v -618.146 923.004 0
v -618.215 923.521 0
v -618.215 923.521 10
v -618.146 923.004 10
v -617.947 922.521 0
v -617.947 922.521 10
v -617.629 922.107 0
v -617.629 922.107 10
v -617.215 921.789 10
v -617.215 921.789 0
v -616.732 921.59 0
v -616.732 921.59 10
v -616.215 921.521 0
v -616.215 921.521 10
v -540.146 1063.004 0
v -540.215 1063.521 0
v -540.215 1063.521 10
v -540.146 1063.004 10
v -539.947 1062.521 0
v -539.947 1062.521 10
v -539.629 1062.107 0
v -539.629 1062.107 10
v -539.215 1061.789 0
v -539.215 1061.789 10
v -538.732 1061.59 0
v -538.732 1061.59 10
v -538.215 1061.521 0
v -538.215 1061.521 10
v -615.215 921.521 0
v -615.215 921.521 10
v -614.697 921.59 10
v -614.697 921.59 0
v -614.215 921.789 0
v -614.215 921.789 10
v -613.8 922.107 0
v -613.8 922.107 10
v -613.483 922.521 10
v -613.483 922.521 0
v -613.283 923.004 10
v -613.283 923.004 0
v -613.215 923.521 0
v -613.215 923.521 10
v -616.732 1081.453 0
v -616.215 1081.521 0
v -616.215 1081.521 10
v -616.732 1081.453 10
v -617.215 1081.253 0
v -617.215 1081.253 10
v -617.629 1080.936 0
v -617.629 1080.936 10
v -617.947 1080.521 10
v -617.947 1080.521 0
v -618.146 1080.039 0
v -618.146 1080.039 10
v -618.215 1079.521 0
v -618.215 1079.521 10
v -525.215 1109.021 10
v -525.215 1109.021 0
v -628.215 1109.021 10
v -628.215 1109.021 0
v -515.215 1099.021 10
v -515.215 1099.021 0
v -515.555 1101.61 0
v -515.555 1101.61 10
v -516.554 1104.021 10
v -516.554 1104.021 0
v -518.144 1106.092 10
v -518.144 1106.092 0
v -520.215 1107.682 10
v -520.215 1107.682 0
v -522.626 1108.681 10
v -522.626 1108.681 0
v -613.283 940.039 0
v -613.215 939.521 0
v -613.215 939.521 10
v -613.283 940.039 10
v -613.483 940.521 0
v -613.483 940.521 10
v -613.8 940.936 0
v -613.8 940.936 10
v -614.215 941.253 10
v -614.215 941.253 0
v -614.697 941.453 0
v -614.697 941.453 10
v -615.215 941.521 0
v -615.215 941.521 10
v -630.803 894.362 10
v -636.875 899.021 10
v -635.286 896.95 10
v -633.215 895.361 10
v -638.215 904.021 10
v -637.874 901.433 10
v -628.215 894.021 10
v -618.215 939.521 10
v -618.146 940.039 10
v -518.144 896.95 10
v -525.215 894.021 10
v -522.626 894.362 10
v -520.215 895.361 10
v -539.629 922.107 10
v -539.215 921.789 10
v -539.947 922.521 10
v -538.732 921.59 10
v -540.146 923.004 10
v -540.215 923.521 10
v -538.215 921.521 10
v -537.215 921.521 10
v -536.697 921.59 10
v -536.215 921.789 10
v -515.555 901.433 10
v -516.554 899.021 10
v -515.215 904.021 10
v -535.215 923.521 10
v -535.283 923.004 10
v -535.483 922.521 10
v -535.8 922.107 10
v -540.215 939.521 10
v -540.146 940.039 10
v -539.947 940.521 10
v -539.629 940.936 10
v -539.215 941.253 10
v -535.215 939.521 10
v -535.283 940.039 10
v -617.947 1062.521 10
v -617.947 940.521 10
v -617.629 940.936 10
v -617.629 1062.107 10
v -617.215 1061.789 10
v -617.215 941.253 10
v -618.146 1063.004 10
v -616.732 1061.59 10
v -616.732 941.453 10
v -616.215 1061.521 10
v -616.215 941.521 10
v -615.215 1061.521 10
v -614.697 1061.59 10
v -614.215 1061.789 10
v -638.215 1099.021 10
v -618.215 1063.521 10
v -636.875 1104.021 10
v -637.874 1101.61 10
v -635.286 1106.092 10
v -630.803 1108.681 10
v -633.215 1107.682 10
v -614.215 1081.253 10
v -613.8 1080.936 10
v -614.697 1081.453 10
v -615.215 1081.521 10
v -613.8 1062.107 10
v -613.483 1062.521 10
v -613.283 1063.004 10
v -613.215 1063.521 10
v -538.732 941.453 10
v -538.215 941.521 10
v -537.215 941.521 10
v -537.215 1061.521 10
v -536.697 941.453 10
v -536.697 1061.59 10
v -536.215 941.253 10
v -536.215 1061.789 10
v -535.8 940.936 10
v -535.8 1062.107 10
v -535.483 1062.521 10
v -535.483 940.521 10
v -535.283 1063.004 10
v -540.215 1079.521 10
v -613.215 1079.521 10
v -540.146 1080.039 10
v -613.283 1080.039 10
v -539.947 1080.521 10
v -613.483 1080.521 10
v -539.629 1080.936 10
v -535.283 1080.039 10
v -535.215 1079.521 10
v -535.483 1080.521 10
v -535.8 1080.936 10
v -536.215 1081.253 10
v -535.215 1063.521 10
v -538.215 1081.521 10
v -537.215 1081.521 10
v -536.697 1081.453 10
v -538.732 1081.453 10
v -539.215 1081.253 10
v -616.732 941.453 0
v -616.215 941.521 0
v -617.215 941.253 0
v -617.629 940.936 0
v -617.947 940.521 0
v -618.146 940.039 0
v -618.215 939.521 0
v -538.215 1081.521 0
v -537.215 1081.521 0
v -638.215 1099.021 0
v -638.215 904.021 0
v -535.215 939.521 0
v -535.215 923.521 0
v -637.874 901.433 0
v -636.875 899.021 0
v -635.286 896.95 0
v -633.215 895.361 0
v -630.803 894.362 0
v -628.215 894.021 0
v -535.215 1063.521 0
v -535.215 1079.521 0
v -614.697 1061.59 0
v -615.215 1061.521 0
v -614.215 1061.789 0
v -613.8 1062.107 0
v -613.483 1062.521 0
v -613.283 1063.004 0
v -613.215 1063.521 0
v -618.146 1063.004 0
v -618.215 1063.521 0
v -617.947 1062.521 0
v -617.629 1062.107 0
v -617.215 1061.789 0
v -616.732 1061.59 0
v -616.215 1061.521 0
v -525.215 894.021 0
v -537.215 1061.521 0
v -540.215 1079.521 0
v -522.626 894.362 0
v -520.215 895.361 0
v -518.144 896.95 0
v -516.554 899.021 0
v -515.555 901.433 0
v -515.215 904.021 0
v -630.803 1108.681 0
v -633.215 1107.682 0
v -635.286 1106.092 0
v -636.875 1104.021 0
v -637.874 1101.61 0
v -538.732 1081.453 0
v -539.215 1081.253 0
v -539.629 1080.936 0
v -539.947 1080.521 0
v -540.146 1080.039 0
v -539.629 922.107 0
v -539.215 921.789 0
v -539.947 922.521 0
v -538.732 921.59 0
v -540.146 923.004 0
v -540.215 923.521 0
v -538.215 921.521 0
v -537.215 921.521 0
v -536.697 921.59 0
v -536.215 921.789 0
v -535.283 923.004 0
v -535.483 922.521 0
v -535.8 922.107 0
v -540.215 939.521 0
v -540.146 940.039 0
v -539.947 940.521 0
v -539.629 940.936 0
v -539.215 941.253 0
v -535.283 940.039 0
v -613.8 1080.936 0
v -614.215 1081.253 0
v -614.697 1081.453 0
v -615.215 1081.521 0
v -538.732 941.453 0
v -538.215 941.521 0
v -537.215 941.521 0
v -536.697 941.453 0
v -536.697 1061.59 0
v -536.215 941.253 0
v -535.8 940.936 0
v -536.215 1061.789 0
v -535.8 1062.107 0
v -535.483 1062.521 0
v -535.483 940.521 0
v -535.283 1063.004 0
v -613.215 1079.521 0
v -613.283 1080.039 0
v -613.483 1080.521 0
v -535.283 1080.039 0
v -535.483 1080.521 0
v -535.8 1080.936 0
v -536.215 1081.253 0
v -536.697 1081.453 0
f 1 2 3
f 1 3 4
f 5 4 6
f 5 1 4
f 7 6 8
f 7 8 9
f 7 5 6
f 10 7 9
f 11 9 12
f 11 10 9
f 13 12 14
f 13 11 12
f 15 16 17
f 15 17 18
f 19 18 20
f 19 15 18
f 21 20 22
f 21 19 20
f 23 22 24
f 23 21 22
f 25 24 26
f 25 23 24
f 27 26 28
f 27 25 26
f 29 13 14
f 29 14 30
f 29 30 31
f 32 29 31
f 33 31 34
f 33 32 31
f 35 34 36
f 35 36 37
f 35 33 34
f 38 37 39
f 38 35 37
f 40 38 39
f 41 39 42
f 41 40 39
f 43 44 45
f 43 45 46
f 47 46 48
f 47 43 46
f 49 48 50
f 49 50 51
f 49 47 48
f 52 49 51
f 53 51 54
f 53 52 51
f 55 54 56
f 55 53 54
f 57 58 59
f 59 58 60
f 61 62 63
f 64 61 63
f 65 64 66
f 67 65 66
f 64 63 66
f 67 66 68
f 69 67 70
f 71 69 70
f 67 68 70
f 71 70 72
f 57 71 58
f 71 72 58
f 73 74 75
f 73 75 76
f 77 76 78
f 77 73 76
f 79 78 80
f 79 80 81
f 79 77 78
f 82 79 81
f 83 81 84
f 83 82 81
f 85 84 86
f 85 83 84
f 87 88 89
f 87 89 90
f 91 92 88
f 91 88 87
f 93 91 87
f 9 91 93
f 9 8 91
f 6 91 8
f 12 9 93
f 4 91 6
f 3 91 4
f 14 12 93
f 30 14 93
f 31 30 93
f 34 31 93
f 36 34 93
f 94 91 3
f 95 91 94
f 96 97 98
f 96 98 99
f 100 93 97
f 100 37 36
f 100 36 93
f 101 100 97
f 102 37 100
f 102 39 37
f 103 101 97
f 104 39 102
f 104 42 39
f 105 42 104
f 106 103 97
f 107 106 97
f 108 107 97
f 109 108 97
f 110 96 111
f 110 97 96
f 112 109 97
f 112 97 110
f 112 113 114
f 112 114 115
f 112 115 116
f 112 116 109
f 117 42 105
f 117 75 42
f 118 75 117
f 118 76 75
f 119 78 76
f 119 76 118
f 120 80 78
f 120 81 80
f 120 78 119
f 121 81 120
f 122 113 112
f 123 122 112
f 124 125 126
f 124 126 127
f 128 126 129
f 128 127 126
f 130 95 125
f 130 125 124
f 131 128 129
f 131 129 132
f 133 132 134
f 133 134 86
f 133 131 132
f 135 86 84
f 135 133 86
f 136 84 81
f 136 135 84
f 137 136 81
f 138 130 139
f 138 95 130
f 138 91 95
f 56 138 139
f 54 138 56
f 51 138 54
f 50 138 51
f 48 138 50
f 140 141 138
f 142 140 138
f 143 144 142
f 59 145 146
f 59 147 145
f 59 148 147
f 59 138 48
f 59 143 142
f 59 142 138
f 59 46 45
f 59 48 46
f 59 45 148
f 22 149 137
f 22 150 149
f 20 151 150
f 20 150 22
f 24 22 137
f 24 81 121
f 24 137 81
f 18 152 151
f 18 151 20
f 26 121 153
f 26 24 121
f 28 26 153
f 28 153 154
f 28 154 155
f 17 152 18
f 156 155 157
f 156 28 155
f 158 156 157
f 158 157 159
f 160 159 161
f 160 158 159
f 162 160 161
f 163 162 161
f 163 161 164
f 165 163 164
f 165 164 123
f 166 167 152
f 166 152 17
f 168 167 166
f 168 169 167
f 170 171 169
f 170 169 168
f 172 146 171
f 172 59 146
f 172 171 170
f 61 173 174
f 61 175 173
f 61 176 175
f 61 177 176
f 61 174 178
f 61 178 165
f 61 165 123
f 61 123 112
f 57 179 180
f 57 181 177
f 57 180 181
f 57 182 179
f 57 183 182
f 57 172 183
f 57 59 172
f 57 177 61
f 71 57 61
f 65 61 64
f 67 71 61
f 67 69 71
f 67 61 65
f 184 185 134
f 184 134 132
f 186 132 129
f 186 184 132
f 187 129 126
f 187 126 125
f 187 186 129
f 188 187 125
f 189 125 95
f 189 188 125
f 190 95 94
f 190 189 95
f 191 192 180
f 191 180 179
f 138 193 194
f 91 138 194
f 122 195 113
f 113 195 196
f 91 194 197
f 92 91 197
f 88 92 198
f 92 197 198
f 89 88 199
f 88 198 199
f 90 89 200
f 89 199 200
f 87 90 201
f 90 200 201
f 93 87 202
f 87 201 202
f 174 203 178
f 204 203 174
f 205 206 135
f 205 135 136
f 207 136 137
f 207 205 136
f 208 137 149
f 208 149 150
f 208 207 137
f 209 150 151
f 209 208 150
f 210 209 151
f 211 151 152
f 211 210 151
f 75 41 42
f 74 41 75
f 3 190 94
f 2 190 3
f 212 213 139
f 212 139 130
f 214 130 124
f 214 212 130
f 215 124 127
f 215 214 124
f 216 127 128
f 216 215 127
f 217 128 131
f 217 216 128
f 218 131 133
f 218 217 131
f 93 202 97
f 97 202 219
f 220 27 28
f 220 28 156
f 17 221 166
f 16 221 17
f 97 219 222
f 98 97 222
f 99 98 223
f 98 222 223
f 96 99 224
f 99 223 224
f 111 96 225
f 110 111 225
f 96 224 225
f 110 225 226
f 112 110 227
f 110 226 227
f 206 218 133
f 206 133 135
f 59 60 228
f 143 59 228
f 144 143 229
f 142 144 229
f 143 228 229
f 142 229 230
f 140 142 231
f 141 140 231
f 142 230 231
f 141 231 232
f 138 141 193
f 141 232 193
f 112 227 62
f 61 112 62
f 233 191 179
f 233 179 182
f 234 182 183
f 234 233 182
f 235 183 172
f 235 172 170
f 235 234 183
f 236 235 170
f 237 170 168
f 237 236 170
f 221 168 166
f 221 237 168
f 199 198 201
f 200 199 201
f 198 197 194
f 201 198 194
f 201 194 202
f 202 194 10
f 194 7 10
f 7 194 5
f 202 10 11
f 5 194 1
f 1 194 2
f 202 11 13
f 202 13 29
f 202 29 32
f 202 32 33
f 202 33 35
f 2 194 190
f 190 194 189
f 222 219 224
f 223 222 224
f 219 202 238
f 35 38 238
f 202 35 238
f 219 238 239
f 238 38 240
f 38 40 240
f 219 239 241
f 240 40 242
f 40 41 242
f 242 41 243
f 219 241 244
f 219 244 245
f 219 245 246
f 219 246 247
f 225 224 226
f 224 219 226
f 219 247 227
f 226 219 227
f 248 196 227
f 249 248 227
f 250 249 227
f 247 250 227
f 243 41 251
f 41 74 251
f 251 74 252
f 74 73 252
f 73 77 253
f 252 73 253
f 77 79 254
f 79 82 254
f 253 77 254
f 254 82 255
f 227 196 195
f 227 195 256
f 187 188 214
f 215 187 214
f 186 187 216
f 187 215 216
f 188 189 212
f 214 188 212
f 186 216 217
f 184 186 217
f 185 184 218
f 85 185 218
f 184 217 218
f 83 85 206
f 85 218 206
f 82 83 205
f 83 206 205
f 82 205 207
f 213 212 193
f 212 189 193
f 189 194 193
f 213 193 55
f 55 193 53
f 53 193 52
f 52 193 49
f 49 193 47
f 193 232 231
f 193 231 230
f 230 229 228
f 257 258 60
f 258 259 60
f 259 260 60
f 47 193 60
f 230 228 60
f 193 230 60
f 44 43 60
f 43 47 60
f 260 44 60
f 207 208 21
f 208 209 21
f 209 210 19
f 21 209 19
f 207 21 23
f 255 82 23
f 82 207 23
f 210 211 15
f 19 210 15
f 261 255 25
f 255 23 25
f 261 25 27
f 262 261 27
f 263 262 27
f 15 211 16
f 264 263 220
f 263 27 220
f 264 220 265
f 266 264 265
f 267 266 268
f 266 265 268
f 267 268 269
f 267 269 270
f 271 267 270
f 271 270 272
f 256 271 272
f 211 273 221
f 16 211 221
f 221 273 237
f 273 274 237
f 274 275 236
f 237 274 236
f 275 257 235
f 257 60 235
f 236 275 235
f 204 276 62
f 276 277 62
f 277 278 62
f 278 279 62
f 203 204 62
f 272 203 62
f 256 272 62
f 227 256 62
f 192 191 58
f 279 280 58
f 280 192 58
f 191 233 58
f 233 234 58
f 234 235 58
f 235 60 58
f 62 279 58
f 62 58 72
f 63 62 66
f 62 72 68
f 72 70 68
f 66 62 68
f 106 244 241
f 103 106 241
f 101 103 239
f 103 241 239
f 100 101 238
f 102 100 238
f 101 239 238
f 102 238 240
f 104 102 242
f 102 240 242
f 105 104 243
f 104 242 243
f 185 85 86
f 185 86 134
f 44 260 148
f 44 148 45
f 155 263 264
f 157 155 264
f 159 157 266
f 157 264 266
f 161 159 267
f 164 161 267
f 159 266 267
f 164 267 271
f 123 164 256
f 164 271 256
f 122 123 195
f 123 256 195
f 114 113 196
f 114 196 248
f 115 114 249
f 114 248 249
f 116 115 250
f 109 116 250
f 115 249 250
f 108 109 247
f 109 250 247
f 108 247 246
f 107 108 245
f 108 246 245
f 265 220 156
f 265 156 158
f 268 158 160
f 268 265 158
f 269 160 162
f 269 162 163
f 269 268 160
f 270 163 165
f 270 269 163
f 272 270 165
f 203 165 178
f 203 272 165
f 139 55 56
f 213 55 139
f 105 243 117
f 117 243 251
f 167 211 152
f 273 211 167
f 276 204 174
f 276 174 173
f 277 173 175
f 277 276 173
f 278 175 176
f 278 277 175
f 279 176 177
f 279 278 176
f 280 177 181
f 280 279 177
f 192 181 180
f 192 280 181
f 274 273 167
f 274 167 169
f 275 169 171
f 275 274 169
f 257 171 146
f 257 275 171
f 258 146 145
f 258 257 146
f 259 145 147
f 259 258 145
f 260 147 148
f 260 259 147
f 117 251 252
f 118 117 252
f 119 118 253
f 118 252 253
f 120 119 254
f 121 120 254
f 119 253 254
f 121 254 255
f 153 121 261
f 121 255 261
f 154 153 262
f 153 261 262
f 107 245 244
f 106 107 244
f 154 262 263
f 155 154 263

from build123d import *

# Parameters (mm, degrees)
SALIENTE_EXTRUIR1_DEPTH = 10


with BuildPart() as part:
    # Croquis2 → Saliente-Extruir1 (new body)
    with BuildSketch(Plane.XY):
        with BuildLine():
            Line((-628.214587467, 894.02140807), (-525.214587467, 894.02140807))
            ThreePointArc((-525.214587467, 894.02140807), (-518.143519656, 896.950340259), (-515.214587467, 904.02140807))
            Line((-515.214587467, 904.02140807), (-515.214587467, 1099.02140807))
            ThreePointArc((-515.214587467, 1099.02140807), (-518.143519656, 1106.092475882), (-525.214587467, 1109.02140807))
            Line((-525.214587467, 1109.02140807), (-628.214587467, 1109.02140807))
            ThreePointArc((-628.214587467, 1109.02140807), (-635.285655279, 1106.092475882), (-638.214587467, 1099.02140807))
            Line((-638.214587467, 1099.02140807), (-638.214587467, 904.02140807))
            ThreePointArc((-638.214587467, 904.02140807), (-635.285655279, 896.950340259), (-628.214587467, 894.02140807))
        make_face()
        with BuildLine():
            Line((-537.214587467, 1081.52140807), (-538.214587467, 1081.52140807))
            ThreePointArc((-538.214587467, 1081.52140807), (-539.62880103, 1080.935621633), (-540.214587467, 1079.52140807))
            Line((-540.214587467, 1079.52140807), (-540.214587467, 1063.52140807))
            ThreePointArc((-540.214587467, 1063.52140807), (-539.62880103, 1062.107194508), (-538.214587467, 1061.52140807))
            Line((-538.214587467, 1061.52140807), (-537.214587467, 1061.52140807))
            ThreePointArc((-537.214587467, 1061.52140807), (-535.800373905, 1062.107194508), (-535.214587467, 1063.52140807))
            Line((-535.214587467, 1063.52140807), (-535.214587467, 1079.52140807))
            ThreePointArc((-535.214587467, 1079.52140807), (-535.800373905, 1080.935621633), (-537.214587467, 1081.52140807))
        make_face(mode=Mode.SUBTRACT)
        with BuildLine():
            Line((-616.214587467, 1061.52140807), (-615.214587467, 1061.52140807))
            ThreePointArc((-615.214587467, 1061.52140807), (-613.800373905, 1062.107194508), (-613.214587467, 1063.52140807))
            Line((-613.214587467, 1063.52140807), (-613.214587467, 1079.52140807))
            ThreePointArc((-613.214587467, 1079.52140807), (-613.800373905, 1080.935621633), (-615.214587467, 1081.52140807))
            Line((-615.214587467, 1081.52140807), (-616.214587467, 1081.52140807))
            ThreePointArc((-616.214587467, 1081.52140807), (-617.62880103, 1080.935621633), (-618.214587467, 1079.52140807))
            Line((-618.214587467, 1079.52140807), (-618.214587467, 1063.52140807))
            ThreePointArc((-618.214587467, 1063.52140807), (-617.62880103, 1062.107194508), (-616.214587467, 1061.52140807))
        make_face(mode=Mode.SUBTRACT)
        with BuildLine():
            Line((-535.214587467, 939.52140807), (-535.214587467, 923.52140807))
            ThreePointArc((-535.214587467, 923.52140807), (-535.800373905, 922.107194508), (-537.214587467, 921.52140807))
            Line((-537.214587467, 921.52140807), (-538.214587467, 921.52140807))
            ThreePointArc((-538.214587467, 921.52140807), (-539.62880103, 922.107194508), (-540.214587467, 923.52140807))
            Line((-540.214587467, 923.52140807), (-540.214587467, 939.52140807))
            ThreePointArc((-540.214587467, 939.52140807), (-539.62880103, 940.935621633), (-538.214587467, 941.52140807))
            Line((-538.214587467, 941.52140807), (-537.214587467, 941.52140807))
            ThreePointArc((-537.214587467, 941.52140807), (-535.800373905, 940.935621633), (-535.214587467, 939.52140807))
        make_face(mode=Mode.SUBTRACT)
        with BuildLine():
            Line((-616.214587467, 921.52140807), (-615.214587467, 921.52140807))
            ThreePointArc((-615.214587467, 921.52140807), (-613.800373905, 922.107194508), (-613.214587467, 923.52140807))
            Line((-613.214587467, 923.52140807), (-613.214587467, 939.52140807))
            ThreePointArc((-613.214587467, 939.52140807), (-613.800373905, 940.935621633), (-615.214587467, 941.52140807))
            Line((-615.214587467, 941.52140807), (-616.214587467, 941.52140807))
            ThreePointArc((-616.214587467, 941.52140807), (-617.62880103, 940.935621633), (-618.214587467, 939.52140807))
            Line((-618.214587467, 939.52140807), (-618.214587467, 923.52140807))
            ThreePointArc((-618.214587467, 923.52140807), (-617.62880103, 922.107194508), (-616.214587467, 921.52140807))
        make_face(mode=Mode.SUBTRACT)
    extrude(amount=SALIENTE_EXTRUIR1_DEPTH)


solid = part.part
